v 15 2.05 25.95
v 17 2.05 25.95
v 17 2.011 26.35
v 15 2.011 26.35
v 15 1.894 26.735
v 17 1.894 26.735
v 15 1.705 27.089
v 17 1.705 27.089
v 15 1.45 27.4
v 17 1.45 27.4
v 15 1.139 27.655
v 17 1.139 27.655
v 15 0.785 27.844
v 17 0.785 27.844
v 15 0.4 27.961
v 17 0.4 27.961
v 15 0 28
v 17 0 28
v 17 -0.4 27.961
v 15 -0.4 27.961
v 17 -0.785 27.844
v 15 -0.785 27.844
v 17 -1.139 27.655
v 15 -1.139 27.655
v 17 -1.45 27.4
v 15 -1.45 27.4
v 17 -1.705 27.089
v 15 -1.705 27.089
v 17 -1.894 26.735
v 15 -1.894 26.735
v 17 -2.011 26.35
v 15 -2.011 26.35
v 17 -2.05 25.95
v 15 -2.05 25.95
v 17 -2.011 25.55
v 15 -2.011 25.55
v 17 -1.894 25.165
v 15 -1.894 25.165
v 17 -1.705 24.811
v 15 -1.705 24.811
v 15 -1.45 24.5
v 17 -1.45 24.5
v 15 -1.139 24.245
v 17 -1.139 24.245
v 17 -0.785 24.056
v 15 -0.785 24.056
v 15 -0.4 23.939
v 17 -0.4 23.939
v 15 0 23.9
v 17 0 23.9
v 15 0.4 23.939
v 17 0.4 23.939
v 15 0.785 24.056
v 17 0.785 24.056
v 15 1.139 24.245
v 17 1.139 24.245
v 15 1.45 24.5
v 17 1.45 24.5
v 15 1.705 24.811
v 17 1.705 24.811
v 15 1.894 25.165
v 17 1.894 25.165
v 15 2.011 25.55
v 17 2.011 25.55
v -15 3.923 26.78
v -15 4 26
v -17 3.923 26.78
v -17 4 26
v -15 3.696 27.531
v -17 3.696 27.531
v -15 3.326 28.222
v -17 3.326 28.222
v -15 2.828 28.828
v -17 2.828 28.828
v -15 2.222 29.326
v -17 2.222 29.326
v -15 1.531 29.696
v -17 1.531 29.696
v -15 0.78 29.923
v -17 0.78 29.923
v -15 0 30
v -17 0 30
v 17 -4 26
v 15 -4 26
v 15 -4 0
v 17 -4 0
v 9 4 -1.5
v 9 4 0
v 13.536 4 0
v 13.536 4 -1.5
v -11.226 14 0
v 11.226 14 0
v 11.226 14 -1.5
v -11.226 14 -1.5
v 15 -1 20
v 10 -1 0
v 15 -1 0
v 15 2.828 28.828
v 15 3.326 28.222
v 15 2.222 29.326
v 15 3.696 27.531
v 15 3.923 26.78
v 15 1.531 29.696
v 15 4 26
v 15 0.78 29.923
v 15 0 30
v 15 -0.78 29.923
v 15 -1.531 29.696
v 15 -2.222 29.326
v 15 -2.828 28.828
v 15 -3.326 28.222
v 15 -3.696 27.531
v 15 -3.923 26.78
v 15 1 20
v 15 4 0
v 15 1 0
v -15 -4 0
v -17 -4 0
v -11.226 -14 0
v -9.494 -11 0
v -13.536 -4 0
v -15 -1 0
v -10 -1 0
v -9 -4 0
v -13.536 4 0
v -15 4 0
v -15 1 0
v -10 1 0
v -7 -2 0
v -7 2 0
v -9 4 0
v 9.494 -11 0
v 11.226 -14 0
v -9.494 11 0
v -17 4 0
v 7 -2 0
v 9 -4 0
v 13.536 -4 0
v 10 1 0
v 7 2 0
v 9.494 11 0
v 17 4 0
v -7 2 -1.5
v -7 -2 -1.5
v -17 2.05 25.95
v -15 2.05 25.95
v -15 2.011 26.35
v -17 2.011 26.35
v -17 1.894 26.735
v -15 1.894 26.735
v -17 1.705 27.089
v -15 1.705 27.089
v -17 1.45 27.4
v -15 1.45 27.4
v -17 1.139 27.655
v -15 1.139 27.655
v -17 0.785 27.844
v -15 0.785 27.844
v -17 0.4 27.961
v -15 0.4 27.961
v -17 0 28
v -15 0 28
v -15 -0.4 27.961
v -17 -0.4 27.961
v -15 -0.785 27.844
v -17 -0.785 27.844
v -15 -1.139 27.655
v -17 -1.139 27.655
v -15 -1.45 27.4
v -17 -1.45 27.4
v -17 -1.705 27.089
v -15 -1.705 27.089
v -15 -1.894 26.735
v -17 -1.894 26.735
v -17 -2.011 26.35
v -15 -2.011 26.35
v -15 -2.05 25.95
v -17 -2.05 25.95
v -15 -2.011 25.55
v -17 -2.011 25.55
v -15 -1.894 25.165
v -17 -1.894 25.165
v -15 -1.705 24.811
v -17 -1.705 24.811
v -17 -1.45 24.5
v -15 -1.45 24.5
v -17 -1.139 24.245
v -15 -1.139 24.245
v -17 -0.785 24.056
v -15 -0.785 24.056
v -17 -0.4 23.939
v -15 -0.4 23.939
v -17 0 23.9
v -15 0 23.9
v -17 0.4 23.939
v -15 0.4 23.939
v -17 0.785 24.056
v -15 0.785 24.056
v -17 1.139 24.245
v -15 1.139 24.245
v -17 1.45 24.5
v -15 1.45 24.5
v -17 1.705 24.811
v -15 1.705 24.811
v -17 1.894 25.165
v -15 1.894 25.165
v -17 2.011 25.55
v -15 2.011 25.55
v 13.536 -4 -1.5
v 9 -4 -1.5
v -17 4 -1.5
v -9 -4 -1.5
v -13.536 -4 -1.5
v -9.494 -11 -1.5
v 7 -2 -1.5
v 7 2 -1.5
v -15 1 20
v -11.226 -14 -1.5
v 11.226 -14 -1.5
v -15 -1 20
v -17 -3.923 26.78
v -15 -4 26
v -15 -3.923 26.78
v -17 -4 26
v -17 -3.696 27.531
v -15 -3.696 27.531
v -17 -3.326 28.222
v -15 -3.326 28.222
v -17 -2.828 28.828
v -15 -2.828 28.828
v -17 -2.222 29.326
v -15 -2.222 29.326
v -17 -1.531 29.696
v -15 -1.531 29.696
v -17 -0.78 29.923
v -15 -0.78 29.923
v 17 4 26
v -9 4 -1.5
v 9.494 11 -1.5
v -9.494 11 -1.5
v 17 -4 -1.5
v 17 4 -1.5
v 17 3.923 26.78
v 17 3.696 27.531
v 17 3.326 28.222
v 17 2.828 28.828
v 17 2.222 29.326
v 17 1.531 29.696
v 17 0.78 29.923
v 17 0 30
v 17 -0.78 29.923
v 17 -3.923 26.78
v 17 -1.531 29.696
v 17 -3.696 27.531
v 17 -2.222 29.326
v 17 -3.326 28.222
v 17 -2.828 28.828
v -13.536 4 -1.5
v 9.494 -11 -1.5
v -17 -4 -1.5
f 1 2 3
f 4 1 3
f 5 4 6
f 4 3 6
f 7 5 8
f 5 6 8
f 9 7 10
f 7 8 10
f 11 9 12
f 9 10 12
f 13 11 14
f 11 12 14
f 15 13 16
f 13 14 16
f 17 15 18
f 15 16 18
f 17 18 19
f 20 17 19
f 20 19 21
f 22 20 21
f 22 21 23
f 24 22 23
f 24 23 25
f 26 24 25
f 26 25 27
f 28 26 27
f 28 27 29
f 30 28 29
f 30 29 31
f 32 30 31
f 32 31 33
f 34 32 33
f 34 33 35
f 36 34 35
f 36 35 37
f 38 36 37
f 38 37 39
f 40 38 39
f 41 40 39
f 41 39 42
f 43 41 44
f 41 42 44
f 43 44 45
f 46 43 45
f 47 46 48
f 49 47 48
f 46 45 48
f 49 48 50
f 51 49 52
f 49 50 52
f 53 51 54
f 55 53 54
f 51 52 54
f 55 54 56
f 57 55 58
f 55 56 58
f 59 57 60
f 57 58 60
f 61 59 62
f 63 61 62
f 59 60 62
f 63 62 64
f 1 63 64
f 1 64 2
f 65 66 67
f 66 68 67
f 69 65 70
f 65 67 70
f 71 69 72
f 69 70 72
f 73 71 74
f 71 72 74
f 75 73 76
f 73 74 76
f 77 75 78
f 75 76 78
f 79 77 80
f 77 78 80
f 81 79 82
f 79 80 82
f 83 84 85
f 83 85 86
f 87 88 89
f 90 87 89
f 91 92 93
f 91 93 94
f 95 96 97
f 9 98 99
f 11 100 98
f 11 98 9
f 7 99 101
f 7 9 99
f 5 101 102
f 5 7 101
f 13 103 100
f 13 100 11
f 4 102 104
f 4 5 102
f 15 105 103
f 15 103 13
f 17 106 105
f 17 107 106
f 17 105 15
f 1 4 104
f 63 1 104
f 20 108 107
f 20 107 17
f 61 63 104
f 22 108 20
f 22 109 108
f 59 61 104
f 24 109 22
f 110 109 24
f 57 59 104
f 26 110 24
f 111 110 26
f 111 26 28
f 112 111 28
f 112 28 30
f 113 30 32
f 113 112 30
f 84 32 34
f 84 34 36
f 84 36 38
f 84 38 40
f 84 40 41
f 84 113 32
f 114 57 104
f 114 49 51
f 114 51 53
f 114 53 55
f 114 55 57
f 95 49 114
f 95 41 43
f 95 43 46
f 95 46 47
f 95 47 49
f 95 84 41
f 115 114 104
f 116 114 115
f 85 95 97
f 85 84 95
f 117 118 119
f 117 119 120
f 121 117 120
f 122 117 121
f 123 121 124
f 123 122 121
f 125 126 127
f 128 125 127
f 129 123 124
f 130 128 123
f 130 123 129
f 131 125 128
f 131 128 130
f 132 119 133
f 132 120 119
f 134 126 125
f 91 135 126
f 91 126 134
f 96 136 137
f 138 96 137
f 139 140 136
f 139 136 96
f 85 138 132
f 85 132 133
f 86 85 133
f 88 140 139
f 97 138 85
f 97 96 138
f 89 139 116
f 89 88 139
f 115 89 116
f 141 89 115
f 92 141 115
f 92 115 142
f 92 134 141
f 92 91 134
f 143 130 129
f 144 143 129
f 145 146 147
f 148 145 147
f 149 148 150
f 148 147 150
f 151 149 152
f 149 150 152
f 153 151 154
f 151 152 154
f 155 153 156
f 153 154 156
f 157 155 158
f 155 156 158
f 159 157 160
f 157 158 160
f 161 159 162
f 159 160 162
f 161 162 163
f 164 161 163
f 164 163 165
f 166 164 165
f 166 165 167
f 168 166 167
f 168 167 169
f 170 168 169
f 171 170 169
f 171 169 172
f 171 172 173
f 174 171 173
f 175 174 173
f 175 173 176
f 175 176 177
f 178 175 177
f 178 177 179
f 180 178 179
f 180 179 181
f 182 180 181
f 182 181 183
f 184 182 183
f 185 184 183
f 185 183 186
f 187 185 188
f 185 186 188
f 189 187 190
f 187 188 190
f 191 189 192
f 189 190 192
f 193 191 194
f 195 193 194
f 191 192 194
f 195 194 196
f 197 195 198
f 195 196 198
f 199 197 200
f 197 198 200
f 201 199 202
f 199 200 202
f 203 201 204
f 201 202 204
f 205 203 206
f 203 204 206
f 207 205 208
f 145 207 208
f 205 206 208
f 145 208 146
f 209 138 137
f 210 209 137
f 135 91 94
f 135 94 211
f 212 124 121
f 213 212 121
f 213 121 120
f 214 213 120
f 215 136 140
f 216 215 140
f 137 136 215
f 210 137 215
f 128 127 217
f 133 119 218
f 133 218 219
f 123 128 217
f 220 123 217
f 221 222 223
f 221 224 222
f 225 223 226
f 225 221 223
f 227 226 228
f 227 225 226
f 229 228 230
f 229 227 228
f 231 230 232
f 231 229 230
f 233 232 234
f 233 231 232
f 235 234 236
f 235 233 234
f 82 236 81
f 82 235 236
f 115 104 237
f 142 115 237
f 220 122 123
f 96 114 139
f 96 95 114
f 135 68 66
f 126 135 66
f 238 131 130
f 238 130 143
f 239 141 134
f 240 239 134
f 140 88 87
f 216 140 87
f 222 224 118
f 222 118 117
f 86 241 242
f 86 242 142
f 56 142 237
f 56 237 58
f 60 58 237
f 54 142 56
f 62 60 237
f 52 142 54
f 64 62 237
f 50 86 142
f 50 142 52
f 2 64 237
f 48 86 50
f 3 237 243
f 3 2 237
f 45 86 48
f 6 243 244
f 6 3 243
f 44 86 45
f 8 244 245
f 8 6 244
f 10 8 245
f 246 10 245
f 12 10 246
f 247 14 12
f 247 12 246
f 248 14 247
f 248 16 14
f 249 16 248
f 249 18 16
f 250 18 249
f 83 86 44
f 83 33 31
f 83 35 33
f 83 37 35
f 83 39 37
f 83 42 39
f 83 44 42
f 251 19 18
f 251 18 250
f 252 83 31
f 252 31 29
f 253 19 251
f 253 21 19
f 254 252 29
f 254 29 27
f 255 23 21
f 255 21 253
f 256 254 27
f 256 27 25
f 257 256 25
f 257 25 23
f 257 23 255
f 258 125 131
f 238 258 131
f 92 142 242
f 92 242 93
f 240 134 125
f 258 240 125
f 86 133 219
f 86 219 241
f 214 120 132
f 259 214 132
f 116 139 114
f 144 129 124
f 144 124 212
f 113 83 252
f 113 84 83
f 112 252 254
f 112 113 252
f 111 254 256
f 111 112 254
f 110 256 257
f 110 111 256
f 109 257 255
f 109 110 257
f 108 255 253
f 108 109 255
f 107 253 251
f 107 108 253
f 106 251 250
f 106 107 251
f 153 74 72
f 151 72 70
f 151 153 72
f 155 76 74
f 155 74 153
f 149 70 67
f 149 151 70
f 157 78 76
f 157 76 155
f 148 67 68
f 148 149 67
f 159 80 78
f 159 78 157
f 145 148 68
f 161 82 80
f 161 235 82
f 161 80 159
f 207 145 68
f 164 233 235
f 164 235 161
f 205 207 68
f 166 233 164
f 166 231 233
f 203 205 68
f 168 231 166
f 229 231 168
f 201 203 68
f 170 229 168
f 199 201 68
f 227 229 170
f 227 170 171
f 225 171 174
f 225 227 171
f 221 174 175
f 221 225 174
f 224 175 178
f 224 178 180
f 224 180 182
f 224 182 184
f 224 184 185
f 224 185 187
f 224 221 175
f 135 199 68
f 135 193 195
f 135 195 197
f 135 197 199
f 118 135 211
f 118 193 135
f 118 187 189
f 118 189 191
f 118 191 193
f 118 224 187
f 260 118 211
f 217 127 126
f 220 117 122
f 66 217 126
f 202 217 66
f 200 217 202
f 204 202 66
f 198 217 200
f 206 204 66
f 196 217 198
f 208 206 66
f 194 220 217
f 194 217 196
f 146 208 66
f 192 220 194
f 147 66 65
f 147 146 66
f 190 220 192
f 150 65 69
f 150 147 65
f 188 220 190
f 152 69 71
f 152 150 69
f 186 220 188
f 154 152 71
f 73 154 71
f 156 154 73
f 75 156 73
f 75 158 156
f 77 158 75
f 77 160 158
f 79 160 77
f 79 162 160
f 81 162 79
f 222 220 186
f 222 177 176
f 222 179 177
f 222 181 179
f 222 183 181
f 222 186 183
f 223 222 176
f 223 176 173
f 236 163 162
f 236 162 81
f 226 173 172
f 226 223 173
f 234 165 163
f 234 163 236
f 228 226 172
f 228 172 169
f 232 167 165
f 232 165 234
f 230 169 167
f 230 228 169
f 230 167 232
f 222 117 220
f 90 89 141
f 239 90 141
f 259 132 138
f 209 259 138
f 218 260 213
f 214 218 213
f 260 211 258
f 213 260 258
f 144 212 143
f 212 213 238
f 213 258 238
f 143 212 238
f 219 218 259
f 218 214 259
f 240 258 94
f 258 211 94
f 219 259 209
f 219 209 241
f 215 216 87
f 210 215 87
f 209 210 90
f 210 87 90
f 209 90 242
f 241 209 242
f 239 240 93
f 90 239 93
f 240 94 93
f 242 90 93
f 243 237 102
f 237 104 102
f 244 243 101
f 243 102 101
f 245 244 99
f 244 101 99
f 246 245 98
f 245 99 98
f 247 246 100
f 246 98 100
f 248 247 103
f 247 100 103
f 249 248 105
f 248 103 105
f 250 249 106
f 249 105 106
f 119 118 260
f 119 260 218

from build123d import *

# Parameters (mm, degrees)
F1_DEPTH = 4
F2_R     = 2.05
F3_DEPTH = 34.001
F5_DEPTH = 1
F7_DEPTH = 1.5
F9_DEPTH = 1.501
F10_SIZE = 2
F11_R    = 3.99999


# Not quite as in the source:
# - a fillet or chamfer is up to 0.001 mm smaller than in the source, because OpenCascade refuses the exact size


with BuildPart() as f1:
    # F0 (on Front) → F1 (new body, symmetric)
    with BuildSketch(Plane.XZ):
        Polygon((15, 0), (0, 0), (-15, 0), (-15, 30), (-17, 30), (-17, -1.5), (0, -1.5), (17, -1.5), (17, 30), (15, 30), align=None)
    extrude(amount=F1_DEPTH, both=True)

    # F2 (on face) → F3 (cut, through all)
    with BuildSketch(Plane.YZ.offset(17)):
        with Locations((0, 25.95)):
            Circle(F2_R)
    extrude(amount=-F3_DEPTH, mode=Mode.SUBTRACT)

    # F4 (on Front) → F5 (join, symmetric)
    with BuildSketch(Plane.XZ):
        Polygon((-10, 0), (-15, 20), (-15, 0), align=None)
        Polygon((15, 20), (10, 0), (15, 0), align=None)
    extrude(amount=F5_DEPTH, both=True)

    # F6 (on face) → F7 (join, through all)
    with BuildSketch(Plane.XY):
        Polygon((15, -4), (-15, -4), (-17, -4), (-11.2264973081, -14), (0, -14), (11.2264973081, -14), (17, -4), align=None)
        Polygon((-11.2264973081, 14), (-17, 4), (-15, 4), (15, 4), (17, 4), (11.2264973081, 14), (0, 14), align=None)
    extrude(amount=-F7_DEPTH)

    # F8 (on face) → F9 (cut, through all)
    with BuildSketch(Plane.XY):
        Polygon((-7, -4), (-13.5358983849, -4), (-9.4944465005, -11), (9.4944465005, -11), (13.5358983849, -4), (7, -4), (7, 4), (13.5358983849, 4), (9.4944465005, 11), (-9.4944465005, 11), (-13.5358983849, 4), (-7, 4), align=None)
    extrude(amount=-F9_DEPTH, mode=Mode.SUBTRACT)

    # F10
    f10_edges = [f1.edges().sort_by_distance(p)[0] for p in [
        (-7, -4, -0.75),
        (-7, 4, -0.75),
        (7, -4, -0.75),
        (7, 4, -0.75),
    ]]
    chamfer(f10_edges, length=F10_SIZE)

    # F11 (radius 4 in the source; OpenCascade refuses exactly that, so slightly less here)
    f11_edges = [f1.edges().sort_by_distance(p)[0] for p in [
        (-16, -4, 30),
        (16, -4, 30),
        (16, 4, 30),
        (-16, 4, 30),
    ]]
    fillet(f11_edges, radius=F11_R)


solid = f1.part
